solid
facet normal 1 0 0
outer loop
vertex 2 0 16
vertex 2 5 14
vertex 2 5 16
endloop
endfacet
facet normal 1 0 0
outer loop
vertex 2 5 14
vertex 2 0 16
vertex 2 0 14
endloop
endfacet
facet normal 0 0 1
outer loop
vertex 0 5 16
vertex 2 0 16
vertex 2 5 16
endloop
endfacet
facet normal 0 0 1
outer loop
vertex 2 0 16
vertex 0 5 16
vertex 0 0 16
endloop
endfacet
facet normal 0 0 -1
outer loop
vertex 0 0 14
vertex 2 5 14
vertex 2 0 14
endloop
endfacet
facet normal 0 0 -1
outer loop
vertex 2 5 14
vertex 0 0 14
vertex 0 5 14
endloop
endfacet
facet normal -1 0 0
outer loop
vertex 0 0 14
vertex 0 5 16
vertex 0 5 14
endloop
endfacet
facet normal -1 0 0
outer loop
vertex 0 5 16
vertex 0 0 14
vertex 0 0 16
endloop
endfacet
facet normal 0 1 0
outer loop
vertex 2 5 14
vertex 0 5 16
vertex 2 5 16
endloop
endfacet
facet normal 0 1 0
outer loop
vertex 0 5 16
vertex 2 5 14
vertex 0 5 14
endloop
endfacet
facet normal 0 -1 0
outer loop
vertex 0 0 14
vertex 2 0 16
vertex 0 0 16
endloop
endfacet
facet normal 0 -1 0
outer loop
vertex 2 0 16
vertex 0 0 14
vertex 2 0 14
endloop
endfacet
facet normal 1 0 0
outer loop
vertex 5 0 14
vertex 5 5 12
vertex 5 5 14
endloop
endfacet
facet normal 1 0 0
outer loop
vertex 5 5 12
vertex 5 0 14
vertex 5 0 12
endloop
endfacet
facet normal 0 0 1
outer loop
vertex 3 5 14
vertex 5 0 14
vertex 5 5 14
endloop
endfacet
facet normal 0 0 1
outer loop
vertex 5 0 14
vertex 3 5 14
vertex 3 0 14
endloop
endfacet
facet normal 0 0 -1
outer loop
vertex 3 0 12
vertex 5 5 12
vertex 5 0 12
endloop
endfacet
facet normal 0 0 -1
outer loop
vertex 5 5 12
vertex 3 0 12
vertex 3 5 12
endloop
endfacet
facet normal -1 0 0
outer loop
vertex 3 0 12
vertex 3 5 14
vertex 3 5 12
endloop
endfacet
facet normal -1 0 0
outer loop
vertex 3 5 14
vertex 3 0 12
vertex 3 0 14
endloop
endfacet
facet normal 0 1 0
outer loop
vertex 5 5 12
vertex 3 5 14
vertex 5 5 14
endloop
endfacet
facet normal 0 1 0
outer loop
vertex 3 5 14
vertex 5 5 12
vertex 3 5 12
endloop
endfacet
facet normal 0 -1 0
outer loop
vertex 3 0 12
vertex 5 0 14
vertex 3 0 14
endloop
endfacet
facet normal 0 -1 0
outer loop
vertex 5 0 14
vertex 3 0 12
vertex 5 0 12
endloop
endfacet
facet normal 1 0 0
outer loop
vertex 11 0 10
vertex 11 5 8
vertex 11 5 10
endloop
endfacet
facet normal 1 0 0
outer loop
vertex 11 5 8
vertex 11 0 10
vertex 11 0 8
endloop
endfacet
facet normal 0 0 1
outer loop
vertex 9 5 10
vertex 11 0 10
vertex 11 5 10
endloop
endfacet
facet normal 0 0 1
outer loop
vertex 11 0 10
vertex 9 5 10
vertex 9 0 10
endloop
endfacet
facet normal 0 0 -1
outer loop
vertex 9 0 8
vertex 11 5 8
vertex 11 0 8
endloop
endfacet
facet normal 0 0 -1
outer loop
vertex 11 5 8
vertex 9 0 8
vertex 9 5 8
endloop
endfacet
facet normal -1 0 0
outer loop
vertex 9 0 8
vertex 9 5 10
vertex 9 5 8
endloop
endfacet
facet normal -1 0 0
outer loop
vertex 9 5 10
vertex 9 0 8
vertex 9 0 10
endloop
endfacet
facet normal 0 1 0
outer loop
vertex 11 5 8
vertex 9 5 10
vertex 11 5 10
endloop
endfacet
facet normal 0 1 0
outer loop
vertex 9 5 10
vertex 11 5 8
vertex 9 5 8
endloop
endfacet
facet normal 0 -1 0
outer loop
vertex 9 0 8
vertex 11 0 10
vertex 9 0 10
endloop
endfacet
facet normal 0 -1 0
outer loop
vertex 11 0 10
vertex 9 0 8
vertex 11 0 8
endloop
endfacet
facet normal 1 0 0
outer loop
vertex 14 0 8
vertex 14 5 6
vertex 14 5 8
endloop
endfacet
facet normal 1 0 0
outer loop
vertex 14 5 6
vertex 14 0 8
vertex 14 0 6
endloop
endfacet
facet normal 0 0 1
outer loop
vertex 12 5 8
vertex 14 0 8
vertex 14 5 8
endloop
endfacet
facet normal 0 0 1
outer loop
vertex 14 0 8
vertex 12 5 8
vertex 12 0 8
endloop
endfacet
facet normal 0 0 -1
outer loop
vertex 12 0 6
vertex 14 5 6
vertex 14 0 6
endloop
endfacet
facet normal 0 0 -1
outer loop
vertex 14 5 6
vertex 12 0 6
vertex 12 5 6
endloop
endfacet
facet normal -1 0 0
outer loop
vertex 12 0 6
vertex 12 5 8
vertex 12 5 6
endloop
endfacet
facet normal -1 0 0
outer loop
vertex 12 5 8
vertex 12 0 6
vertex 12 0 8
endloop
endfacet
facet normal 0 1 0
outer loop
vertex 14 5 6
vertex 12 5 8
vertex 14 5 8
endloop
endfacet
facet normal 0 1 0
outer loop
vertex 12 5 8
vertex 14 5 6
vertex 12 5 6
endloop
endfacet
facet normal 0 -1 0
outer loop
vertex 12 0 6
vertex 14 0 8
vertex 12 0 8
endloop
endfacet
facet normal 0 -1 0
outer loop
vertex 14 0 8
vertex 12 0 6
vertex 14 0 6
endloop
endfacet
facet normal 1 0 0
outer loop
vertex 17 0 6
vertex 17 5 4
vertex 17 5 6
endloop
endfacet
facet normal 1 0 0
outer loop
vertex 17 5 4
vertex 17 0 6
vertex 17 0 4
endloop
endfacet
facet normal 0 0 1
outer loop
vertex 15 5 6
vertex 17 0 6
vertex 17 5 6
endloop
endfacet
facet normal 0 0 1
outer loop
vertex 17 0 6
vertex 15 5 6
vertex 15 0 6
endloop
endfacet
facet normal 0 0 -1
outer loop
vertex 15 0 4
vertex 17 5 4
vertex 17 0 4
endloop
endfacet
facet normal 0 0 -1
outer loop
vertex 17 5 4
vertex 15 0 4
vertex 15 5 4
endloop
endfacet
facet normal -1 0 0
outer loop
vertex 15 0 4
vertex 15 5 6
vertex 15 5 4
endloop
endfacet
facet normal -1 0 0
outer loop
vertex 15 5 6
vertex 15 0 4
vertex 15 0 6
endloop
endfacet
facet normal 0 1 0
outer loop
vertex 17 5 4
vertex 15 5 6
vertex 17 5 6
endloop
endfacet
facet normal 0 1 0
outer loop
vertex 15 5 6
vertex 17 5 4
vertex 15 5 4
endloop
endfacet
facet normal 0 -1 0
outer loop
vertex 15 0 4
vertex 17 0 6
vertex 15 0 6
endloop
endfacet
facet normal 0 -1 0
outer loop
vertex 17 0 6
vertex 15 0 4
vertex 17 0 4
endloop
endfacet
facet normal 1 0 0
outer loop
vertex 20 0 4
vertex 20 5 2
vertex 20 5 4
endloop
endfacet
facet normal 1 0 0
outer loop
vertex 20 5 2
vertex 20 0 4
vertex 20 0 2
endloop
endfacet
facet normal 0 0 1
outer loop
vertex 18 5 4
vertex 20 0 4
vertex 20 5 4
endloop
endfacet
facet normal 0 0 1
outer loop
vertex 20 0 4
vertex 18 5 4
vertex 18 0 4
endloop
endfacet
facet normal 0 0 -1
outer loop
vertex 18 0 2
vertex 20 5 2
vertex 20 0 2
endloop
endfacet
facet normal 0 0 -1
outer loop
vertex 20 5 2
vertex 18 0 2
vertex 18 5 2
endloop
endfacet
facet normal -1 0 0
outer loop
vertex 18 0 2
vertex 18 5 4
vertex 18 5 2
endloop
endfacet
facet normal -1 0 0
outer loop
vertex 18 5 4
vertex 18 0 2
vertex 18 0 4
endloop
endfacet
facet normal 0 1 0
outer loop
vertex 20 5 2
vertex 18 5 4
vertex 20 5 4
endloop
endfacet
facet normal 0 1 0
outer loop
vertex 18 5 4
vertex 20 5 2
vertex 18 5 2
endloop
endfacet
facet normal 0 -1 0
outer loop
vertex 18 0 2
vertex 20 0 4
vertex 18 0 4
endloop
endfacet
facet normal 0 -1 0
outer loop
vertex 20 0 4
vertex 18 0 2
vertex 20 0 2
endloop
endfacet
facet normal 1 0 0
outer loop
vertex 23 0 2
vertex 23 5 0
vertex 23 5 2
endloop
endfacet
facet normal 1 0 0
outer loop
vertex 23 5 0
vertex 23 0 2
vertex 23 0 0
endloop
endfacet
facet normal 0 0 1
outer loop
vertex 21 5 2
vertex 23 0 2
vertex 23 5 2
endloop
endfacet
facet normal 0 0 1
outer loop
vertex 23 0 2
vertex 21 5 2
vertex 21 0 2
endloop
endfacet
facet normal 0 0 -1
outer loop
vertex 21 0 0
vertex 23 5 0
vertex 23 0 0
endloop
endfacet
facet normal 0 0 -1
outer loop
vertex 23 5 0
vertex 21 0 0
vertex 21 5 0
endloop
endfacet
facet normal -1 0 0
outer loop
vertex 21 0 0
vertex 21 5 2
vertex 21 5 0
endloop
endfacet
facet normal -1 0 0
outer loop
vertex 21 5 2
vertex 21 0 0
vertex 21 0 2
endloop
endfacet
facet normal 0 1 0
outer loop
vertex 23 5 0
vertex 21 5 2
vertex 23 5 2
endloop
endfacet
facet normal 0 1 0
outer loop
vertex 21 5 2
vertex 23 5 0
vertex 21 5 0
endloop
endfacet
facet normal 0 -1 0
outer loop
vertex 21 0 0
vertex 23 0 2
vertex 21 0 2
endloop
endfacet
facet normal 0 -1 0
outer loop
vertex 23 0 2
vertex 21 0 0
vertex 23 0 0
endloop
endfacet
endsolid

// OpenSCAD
union() {
  for (i = [0:7]) {
    if (i != 2) {
      translate([i * 3, 0, (7 - i) * 2]) cube(size=[2,5,2], center=false);
    }
  }
}
